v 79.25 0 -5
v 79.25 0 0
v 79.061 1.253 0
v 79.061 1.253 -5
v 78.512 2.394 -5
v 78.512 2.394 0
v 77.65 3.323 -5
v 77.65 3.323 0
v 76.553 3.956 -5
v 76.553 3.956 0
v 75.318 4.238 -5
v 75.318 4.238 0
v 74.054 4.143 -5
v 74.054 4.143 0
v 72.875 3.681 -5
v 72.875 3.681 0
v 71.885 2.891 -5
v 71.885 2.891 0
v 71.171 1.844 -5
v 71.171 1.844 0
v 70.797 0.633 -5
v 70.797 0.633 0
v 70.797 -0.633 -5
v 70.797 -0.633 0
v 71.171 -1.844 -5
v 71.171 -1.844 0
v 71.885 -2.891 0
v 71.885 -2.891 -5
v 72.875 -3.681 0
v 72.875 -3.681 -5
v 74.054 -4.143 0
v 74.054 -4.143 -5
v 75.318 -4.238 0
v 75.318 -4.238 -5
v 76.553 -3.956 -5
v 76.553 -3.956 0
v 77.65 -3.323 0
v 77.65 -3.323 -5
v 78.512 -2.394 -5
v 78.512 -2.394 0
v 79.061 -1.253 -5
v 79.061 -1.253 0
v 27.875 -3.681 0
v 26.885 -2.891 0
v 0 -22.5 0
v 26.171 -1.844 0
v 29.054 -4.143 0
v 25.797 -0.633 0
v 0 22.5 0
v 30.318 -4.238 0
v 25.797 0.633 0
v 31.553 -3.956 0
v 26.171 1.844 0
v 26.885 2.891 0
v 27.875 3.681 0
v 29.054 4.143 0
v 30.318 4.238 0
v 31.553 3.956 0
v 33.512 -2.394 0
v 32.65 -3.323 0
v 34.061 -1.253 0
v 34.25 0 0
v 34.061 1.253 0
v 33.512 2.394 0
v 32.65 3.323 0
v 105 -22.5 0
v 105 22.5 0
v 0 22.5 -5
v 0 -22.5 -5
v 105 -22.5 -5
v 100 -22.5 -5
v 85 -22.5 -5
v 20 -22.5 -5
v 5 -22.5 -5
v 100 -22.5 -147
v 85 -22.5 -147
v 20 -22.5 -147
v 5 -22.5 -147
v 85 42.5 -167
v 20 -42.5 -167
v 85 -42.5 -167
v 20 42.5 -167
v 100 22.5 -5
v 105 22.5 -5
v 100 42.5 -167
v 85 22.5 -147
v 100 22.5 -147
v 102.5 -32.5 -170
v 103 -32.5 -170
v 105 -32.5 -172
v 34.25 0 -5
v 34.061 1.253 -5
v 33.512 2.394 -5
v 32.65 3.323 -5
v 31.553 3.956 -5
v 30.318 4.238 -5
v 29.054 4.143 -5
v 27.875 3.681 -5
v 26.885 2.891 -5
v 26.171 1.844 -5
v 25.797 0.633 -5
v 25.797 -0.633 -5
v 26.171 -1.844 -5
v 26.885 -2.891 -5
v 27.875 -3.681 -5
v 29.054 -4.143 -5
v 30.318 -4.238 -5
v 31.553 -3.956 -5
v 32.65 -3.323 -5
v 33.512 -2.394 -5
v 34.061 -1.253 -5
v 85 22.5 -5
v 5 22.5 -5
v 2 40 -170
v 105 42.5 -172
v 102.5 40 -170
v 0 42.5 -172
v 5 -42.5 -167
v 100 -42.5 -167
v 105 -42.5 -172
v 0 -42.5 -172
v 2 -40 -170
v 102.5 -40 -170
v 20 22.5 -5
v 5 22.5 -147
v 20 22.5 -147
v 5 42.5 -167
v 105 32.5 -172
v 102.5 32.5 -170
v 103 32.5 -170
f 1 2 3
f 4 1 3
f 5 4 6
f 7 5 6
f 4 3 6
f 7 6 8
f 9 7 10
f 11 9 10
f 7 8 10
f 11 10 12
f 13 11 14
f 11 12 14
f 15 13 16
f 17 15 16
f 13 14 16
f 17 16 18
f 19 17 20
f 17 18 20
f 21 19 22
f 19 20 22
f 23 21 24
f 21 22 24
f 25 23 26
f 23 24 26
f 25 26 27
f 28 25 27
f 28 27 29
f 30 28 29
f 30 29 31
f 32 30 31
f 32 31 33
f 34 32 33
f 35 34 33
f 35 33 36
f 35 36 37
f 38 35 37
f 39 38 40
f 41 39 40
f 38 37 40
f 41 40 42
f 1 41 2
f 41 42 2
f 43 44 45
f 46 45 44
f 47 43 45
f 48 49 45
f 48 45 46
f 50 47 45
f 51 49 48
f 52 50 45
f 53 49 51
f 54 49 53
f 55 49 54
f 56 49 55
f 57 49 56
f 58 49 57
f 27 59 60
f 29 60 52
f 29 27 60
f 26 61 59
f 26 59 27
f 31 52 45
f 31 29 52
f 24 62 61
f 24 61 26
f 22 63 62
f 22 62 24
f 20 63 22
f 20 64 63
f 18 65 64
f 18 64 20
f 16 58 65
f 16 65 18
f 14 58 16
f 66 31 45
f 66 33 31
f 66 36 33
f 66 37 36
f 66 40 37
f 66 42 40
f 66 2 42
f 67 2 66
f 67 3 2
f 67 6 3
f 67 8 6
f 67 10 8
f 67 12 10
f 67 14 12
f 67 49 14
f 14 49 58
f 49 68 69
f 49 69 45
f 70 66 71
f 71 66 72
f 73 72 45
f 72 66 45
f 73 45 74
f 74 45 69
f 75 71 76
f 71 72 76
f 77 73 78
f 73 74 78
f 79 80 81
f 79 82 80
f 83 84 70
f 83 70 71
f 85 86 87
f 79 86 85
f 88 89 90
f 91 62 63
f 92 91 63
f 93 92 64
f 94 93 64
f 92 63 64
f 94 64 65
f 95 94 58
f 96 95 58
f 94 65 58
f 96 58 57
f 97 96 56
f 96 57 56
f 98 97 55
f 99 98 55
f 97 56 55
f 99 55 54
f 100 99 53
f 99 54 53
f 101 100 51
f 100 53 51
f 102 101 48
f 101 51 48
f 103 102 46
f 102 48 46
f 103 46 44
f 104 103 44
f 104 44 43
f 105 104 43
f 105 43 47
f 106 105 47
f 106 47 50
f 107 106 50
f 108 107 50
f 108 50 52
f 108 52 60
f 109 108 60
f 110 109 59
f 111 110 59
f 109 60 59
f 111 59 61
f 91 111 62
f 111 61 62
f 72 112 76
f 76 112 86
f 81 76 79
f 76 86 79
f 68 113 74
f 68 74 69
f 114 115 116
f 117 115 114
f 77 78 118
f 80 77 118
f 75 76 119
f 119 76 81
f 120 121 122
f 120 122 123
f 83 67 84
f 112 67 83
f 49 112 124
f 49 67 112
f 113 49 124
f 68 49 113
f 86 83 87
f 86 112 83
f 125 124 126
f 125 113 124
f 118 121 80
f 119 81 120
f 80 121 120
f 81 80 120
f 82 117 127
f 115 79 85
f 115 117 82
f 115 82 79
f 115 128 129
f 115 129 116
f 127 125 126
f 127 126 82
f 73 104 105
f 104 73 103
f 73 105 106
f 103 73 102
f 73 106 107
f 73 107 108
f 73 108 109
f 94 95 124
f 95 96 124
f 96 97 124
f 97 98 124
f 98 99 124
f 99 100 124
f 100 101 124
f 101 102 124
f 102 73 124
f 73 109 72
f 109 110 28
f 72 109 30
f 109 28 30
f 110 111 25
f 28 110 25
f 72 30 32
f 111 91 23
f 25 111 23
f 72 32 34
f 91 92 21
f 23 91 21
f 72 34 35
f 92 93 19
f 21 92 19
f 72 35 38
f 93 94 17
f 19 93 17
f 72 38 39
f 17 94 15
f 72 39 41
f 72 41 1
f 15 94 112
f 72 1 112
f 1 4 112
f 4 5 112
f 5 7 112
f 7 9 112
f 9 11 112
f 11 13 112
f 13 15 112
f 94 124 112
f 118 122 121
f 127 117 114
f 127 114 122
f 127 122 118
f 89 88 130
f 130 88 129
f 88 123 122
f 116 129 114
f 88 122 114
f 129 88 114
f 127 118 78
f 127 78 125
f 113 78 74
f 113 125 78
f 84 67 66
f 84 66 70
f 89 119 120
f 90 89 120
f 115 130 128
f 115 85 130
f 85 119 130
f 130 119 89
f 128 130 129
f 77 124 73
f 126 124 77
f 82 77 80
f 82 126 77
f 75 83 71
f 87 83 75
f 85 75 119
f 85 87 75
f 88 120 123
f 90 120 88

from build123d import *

# Parameters (mm, degrees)
SKETCH1_W           = 65
SKETCH1_H           = 162
BOSS_EXTRUDE1_DEPTH = 42.5
CUT_EXTRUDE1_DEPTH  = 206.949629764
SKETCH4_R           = 4.25
CUT_EXTRUDE2_DEPTH  = 5
SKETCH5_W           = 2
SKETCH5_H           = 65
CUT_EXTRUDE3_DEPTH  = 206.949629919


with BuildPart() as part:
    # Sketch1 → Boss-Extrude1 (new, symmetric)
    with BuildSketch(Plane(origin=(0, 0, 0), x_dir=(1, 0, 0), z_dir=(0, 1, 0))):
        Polygon((100, 5), (100, 167), (105, 172), (0, 172), (5, 167), (5, 5), (0, 5), (0, 0), (105, 0), (105, 5), align=None)
        with Locations((52.5, 86)):
            Rectangle(SKETCH1_W, SKETCH1_H, mode=Mode.SUBTRACT)
    extrude(amount=BOSS_EXTRUDE1_DEPTH, both=True)

    # Sketch2 → Cut-Extrude1 (cut, through all)
    with BuildSketch(Plane(origin=(0, 0, 0), x_dir=(0, 0, -1), z_dir=(1, 0, 0))):
        Polygon((0, 22.5), (147, 22.5), (167, 42.5), (0, 42.5), align=None)
    cut_extrude1 = extrude(amount=CUT_EXTRUDE1_DEPTH, mode=Mode.SUBTRACT)

    # Mirror1: Cut-Extrude1 across plane
    add(cut_extrude1.mirror(Plane.ZX), mode=Mode.SUBTRACT)

    # Sketch3 → section 0 of cut_loft1
    with BuildSketch(Plane(origin=(0, 0, -170), x_dir=(-1, 0, 0), z_dir=(0, 0, -1)), mode=Mode.PRIVATE) as cut_loft1_s0:
        with BuildLine():
            Line((-102.5, 40), (0, 40))
            Line((0, 40), (0, -40))
            Line((0, -40), (-102.5, -40))
            Line((-102.5, -40), (-102.5, 40))
        make_face()
    # loft up to a face of the part (cut_loft1)
    loft([cut_loft1_s0.sketch, part.faces().sort_by_distance((52.5, 0, -172))[0]], mode=Mode.SUBTRACT)

    # Sketch4 → Cut-Extrude2 (cut)
    with BuildSketch(Plane.XY):
        with Locations((30, 0)):
            Circle(SKETCH4_R)
        with Locations((75, 0)):
            Circle(SKETCH4_R)
    extrude(amount=-CUT_EXTRUDE2_DEPTH, mode=Mode.SUBTRACT)

    # Sketch5 → Cut-Extrude3 (cut, through all)
    with BuildSketch(Plane(origin=(0, 0, 0), x_dir=(0, 0, -1), z_dir=(1, 0, 0))):
        with Locations((171, 0)):
            Rectangle(SKETCH5_W, SKETCH5_H)
    extrude(amount=CUT_EXTRUDE3_DEPTH, mode=Mode.SUBTRACT)


solid = part.part
